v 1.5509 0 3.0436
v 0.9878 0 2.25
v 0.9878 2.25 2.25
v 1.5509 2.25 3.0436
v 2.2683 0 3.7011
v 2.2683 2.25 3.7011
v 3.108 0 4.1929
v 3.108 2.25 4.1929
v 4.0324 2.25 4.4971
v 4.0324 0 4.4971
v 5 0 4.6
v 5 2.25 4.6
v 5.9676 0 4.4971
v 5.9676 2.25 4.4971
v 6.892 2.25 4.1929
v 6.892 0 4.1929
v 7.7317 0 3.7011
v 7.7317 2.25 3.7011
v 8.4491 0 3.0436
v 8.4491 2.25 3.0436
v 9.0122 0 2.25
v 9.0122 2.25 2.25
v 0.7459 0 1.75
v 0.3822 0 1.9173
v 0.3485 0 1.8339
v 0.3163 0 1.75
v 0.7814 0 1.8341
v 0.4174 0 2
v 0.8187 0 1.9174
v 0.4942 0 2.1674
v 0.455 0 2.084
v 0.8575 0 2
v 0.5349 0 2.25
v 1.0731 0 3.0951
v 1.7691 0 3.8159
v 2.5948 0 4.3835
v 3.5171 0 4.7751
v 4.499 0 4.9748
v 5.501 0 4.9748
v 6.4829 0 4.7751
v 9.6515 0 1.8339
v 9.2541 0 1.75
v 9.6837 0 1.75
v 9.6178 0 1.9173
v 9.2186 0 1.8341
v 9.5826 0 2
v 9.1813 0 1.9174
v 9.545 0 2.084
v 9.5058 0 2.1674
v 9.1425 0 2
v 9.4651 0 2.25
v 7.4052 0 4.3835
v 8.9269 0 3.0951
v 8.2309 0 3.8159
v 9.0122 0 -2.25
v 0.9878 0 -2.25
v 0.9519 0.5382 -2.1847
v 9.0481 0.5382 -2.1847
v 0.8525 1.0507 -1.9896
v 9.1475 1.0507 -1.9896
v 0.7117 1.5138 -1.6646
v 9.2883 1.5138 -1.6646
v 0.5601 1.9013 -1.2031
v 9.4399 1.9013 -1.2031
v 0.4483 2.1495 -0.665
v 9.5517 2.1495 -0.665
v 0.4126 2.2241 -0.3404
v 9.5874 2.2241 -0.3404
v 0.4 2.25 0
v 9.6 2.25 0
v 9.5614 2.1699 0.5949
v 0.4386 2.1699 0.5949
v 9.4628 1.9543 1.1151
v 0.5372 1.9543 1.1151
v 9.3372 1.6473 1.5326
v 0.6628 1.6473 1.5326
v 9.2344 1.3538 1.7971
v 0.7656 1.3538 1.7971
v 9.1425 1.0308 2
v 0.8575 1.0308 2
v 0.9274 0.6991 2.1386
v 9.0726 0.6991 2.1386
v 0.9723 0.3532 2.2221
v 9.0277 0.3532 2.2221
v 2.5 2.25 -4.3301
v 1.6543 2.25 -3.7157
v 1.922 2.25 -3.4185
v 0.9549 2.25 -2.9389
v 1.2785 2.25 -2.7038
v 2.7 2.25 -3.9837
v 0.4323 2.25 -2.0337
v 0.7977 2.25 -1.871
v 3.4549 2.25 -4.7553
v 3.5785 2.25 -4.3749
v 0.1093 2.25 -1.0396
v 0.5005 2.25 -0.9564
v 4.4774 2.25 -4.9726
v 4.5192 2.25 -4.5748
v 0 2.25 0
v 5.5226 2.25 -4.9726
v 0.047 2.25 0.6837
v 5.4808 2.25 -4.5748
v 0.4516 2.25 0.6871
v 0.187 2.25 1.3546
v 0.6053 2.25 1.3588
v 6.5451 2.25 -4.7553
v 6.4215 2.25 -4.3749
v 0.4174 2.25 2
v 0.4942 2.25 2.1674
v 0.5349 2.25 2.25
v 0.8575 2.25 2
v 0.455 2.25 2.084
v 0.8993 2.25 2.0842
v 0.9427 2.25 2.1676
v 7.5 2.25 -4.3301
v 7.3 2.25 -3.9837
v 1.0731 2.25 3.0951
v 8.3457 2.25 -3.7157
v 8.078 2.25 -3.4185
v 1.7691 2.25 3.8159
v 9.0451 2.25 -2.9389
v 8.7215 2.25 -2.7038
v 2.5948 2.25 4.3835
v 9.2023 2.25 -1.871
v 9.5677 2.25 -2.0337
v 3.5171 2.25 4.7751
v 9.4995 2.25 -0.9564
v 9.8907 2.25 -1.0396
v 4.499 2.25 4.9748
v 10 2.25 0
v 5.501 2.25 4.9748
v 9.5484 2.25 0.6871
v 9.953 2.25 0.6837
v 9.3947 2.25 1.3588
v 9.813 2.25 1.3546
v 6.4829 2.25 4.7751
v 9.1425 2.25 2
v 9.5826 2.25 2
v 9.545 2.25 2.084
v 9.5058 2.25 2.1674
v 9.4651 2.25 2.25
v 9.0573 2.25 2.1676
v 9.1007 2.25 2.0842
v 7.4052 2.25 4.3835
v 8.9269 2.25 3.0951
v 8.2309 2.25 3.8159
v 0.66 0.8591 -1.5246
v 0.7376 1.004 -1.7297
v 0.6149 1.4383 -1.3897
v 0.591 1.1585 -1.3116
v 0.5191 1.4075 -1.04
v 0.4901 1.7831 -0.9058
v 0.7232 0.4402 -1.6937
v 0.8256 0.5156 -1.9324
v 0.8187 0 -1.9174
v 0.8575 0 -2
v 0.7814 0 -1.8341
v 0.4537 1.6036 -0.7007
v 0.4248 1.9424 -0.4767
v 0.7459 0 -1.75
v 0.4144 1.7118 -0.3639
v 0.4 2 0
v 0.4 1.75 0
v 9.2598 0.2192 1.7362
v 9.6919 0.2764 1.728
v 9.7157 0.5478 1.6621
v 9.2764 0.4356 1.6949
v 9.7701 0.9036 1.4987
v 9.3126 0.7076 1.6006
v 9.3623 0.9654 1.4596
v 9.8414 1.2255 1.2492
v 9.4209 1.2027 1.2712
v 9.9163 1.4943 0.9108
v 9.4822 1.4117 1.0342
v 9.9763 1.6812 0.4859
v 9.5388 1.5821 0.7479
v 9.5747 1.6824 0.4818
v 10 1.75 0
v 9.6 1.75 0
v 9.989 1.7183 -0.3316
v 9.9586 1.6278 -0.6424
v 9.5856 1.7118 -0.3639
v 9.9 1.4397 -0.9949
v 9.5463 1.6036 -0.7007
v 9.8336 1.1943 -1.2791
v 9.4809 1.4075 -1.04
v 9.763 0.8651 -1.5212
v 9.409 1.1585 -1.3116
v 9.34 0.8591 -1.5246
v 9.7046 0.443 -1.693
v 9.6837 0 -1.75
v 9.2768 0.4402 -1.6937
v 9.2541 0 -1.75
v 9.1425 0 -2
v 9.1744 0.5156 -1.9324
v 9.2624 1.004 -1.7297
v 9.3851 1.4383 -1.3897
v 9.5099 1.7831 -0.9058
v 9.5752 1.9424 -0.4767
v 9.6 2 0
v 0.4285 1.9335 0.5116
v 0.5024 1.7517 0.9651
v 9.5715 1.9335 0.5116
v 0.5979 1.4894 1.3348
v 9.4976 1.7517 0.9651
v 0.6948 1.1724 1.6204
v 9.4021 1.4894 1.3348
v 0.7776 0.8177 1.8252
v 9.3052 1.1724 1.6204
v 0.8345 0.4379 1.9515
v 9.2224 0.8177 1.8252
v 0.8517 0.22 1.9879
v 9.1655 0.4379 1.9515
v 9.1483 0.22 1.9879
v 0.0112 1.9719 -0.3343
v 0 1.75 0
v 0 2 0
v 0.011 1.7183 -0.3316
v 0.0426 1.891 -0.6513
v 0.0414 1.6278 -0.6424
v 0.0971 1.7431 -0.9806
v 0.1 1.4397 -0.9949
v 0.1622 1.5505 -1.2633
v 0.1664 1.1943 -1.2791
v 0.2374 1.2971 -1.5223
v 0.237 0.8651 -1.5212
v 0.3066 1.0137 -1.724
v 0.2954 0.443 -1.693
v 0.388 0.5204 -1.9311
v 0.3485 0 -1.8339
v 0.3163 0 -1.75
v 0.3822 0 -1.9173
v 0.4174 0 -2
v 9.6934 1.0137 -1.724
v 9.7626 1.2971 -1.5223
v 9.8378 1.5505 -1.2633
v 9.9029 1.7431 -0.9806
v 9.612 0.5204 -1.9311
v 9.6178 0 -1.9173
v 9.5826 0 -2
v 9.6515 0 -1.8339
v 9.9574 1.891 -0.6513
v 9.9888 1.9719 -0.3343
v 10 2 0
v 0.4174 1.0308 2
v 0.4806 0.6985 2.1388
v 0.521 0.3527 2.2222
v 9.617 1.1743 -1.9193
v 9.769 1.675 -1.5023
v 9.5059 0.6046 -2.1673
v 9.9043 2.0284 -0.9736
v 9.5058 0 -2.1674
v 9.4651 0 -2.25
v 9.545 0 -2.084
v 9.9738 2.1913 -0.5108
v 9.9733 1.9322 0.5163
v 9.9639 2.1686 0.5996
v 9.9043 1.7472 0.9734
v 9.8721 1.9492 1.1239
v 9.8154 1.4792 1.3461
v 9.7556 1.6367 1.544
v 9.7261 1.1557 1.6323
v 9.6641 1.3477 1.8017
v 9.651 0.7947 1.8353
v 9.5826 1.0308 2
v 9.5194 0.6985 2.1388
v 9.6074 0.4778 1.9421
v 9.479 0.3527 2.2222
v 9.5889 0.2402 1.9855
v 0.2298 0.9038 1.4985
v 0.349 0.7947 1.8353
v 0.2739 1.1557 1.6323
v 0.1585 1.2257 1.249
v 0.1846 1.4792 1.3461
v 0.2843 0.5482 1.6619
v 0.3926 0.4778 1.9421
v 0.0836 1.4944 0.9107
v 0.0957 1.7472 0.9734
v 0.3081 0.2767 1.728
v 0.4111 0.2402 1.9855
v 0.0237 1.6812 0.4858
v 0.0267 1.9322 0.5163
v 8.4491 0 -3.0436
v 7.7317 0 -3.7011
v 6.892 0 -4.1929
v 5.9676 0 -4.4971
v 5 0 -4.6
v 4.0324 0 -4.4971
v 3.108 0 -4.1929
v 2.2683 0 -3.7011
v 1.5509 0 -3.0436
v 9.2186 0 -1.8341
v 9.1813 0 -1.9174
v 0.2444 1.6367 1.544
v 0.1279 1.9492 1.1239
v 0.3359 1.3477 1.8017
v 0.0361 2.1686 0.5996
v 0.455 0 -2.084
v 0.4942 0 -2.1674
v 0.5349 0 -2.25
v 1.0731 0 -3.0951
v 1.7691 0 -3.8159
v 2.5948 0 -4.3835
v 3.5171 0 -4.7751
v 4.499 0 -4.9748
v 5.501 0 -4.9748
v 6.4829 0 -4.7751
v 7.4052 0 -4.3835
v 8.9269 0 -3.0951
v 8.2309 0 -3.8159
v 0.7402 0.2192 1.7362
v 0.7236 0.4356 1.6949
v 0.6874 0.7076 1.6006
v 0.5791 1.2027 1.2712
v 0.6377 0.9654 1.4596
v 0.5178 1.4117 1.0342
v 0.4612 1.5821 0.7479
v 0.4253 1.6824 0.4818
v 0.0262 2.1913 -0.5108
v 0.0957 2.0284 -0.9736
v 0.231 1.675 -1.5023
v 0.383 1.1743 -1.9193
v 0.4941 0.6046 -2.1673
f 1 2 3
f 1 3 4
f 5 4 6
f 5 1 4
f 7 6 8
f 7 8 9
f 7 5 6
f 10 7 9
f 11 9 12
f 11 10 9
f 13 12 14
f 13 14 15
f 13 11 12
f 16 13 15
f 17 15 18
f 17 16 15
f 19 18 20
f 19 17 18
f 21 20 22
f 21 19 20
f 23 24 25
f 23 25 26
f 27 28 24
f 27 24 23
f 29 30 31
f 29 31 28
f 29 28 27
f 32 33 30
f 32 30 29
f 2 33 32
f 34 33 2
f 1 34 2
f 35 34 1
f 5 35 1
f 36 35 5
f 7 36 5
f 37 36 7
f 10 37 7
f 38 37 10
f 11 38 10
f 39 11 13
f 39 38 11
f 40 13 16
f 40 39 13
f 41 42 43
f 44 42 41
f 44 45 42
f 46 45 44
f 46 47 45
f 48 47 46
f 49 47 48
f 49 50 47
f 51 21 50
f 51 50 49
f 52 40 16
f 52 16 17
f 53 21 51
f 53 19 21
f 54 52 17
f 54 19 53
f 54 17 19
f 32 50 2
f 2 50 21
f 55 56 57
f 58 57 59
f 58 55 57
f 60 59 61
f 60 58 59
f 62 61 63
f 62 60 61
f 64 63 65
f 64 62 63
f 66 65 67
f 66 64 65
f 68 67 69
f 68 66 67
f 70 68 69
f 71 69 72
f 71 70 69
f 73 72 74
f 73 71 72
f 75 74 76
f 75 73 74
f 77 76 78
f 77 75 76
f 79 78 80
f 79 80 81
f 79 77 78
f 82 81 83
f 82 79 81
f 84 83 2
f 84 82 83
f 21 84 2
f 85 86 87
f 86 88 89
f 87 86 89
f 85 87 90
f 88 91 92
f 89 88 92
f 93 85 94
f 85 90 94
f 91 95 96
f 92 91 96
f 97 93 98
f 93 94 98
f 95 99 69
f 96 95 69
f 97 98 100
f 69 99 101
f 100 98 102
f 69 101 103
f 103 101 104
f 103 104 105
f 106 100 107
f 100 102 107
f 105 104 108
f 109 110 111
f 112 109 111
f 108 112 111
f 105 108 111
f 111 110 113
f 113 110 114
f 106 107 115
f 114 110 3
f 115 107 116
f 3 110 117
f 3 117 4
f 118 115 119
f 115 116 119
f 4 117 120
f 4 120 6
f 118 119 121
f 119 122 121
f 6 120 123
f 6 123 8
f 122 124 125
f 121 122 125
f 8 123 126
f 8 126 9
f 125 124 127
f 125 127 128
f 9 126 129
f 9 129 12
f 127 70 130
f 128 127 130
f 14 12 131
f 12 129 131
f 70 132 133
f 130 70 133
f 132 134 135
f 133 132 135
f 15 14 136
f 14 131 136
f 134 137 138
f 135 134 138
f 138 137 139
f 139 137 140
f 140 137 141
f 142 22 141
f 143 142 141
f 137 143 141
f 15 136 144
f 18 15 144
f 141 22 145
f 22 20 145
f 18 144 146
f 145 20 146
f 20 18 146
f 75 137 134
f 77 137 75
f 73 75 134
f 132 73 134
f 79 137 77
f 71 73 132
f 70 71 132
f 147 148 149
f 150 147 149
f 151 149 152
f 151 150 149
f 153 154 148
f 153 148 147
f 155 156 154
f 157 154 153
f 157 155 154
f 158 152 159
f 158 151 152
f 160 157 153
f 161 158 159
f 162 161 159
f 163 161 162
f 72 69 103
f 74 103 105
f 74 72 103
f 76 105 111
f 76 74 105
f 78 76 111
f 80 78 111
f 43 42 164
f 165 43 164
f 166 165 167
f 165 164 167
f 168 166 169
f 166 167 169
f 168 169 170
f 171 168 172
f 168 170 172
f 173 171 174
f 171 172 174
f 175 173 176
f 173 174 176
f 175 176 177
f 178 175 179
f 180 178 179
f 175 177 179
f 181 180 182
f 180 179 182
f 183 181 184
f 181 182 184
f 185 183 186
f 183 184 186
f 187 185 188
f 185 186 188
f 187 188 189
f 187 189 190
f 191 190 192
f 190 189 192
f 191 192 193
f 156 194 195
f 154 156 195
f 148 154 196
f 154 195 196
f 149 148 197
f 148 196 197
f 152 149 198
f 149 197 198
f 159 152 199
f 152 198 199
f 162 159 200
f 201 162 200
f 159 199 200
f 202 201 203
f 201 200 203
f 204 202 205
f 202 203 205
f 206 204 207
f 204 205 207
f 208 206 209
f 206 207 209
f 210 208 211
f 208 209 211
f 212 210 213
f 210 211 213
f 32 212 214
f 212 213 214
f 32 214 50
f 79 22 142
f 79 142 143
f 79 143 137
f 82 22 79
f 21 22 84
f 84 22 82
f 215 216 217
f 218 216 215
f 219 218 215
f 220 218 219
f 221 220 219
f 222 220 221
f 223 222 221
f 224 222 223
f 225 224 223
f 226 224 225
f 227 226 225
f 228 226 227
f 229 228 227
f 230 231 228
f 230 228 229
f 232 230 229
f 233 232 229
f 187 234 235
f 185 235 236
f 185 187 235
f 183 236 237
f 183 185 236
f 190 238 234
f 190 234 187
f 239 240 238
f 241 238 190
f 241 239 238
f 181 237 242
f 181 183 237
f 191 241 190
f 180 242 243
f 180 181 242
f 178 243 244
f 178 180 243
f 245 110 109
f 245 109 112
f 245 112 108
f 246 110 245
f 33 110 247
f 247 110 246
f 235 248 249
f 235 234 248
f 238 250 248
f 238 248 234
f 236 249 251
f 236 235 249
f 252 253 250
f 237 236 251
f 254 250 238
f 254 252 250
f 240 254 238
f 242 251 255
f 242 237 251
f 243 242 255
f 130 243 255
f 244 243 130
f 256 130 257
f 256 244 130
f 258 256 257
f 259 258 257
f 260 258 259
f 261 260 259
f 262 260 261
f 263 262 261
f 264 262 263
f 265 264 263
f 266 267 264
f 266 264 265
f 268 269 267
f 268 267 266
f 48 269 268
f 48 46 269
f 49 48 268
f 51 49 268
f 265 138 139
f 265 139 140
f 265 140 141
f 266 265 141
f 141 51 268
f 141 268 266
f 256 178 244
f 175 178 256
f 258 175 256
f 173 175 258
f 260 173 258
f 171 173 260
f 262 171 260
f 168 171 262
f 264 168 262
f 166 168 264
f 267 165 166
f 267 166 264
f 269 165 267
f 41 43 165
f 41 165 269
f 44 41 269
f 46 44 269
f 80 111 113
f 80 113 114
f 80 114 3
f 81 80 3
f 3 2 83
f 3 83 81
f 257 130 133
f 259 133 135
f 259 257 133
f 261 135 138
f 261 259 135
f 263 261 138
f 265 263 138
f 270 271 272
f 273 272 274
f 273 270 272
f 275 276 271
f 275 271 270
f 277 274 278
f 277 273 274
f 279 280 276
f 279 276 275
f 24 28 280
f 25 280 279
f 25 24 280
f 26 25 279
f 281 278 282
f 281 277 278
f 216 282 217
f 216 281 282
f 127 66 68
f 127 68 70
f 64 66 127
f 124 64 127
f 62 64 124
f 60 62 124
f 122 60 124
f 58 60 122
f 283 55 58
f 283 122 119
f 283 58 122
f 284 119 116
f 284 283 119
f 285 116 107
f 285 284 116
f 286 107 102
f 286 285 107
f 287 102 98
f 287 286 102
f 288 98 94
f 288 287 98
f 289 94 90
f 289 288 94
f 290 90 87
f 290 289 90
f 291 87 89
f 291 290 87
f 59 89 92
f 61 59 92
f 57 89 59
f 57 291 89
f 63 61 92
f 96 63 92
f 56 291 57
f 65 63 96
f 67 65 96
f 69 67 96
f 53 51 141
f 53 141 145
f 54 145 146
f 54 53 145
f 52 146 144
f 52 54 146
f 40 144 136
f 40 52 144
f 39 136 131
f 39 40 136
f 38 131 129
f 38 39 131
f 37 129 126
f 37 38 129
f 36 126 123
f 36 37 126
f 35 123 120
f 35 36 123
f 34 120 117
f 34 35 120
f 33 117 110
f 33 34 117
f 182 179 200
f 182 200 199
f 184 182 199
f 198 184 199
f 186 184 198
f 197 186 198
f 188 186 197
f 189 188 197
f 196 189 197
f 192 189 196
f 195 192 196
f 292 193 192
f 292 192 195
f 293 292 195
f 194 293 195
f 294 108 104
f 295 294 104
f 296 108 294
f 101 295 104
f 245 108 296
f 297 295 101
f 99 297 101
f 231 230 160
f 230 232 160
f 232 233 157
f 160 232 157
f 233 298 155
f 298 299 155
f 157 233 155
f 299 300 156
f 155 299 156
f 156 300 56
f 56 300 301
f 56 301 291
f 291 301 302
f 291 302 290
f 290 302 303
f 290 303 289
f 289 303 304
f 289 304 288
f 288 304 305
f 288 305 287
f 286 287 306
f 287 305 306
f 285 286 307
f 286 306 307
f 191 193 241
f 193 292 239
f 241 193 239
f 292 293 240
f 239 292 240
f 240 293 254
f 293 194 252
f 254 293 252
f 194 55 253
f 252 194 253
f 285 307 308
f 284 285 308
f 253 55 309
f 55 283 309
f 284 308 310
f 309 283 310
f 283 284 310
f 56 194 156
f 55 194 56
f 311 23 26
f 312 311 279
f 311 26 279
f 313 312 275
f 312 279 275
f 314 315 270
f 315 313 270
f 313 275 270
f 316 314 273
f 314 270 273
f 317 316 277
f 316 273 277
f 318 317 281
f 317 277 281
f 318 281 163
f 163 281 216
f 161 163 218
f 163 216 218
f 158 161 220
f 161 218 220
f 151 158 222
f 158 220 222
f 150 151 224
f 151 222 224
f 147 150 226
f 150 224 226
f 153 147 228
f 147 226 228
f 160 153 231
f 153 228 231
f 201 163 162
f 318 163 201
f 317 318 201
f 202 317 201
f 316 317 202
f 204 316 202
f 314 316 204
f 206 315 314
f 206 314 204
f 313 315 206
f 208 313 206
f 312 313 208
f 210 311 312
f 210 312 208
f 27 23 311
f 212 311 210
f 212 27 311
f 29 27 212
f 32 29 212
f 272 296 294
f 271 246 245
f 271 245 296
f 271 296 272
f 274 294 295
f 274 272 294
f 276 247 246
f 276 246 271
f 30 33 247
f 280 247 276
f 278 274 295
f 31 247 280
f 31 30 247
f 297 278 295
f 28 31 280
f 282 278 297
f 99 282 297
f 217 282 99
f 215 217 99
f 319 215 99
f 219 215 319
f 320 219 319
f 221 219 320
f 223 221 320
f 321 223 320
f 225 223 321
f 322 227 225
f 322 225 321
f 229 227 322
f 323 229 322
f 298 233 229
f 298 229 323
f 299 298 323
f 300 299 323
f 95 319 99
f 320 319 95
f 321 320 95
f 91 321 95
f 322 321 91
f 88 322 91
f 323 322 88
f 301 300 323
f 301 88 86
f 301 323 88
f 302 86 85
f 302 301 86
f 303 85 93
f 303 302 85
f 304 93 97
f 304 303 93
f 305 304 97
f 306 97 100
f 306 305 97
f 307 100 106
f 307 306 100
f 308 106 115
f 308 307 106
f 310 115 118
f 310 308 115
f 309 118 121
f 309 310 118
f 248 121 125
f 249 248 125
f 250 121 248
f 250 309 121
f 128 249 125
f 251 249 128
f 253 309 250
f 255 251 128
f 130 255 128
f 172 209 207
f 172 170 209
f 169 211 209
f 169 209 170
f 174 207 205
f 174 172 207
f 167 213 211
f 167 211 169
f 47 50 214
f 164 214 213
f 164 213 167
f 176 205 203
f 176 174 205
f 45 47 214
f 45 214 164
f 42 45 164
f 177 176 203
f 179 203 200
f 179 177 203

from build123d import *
from build123d.topology import SkipClean

# Parameters (mm, degrees)
SKETCH3_R             = 1.75
STIR_BAR_DEPTH        = 10
SKETCH4_W             = 10.5
SKETCH4_H             = 0.25
STIR_BAR_HOLDER_ANGLE = 180
BOSS_EXTRUDE1_DEPTH   = 2.25
SKETCH10_R            = 5.711829829
SKETCH10_R_2          = 5
CUT_EXTRUDE5_DEPTH    = 12.624328088
SKETCH9_R             = 1.75
CUT_EXTRUDE6_DEPTH    = 12.404494879


with BuildPart() as part:
    # Sketch3 → Stir Bar (new body)
    with BuildSketch(Plane(origin=(0, 0, 0), x_dir=(0, 0, -1), z_dir=(1, 0, 0))):
        Circle(SKETCH3_R)
    extrude(amount=STIR_BAR_DEPTH)



with BuildPart() as body_2:
    # Sketch4 → Stir Bar Holder (revolve)
    with BuildSketch(Plane(origin=(0, 0, 0), x_dir=(1, 0, 0), z_dir=(0, 1, 0))):
        with Locations((5, 2.125)):
            Rectangle(SKETCH4_W, SKETCH4_H)
    revolve(axis=Axis((-0.25, 0, 0), (1, 0, 0)), revolution_arc=STIR_BAR_HOLDER_ANGLE)


with BuildPart() as part_1:
    with SkipClean():  # the faces are left unmerged after this step: merging them gives an invalid solid
        add(part.part)

        add(body_2.part)  # Boss-Extrude1 merges body 2
        # Sketch5 → Boss-Extrude1 (add, through all)
        with BuildSketch(Plane.XZ):
            with BuildLine():
                ThreePointArc((0.987831011, 2.25), (5, 4.6), (9.012168989, 2.25))
                Line((9.012168989, 2.25), (9.465142775, 2.25))
                ThreePointArc((9.465142775, 2.25), (5, 5), (0.534857225, 2.25))
                Line((0.534857225, 2.25), (0.987831011, 2.25))
            make_face()
            with BuildLine():
                ThreePointArc((9.012168989, 2.25), (9.079231651, 2.125998385), (9.142463035, 2))
                Line((9.142463035, 2), (9.582575695, 2))
                ThreePointArc((9.582575695, 2), (9.52558586, 2.125811051), (9.465142775, 2.25))
                Line((9.465142775, 2.25), (9.012168989, 2.25))
            make_face()
            with BuildLine():
                Line((0.417424305, 2), (0.857536965, 2))
                ThreePointArc((0.857536965, 2), (0.920768349, 2.125998385), (0.987831011, 2.25))
                Line((0.987831011, 2.25), (0.534857225, 2.25))
                ThreePointArc((0.534857225, 2.25), (0.47441414, 2.125811051), (0.417424305, 2))
            make_face()
            with BuildLine():
                ThreePointArc((9.142463035, 2), (9.484157109, 1.025833816), (9.6, 0))
                Line((9.6, 0), (10, 0))
                ThreePointArc((10, 0), (9.894531565, 1.021548218), (9.582575695, 2))
                Line((9.582575695, 2), (9.142463035, 2))
            make_face()
            with BuildLine():
                Line((0, 0), (0.4, 0))
                ThreePointArc((0.4, 0), (0.515842891, 1.025833816), (0.857536965, 2))
                Line((0.857536965, 2), (0.417424305, 2))
                ThreePointArc((0.417424305, 2), (0.105468435, 1.021548218), (0, 0))
            make_face()
            with BuildLine():
                Line((10, 0), (9.6, 0))
                ThreePointArc((9.6, 0), (5, -4.6), (0.4, 0))
                Line((0.4, 0), (0, 0))
                ThreePointArc((0, 0), (5, -5), (10, 0))
            make_face()
        extrude(amount=-BOSS_EXTRUDE1_DEPTH)

    # Sketch10 → Cut-Extrude5 (cut, through all)
    with BuildSketch(Plane.XZ):
        with Locations((5, 0)):
            Circle(SKETCH10_R)
        with Locations(Location((5, 0, 0), (0, 0, 270))):
            Circle(SKETCH10_R_2, mode=Mode.SUBTRACT)
    extrude(amount=-CUT_EXTRUDE5_DEPTH, mode=Mode.SUBTRACT)

    # Sketch9 → Cut-Extrude6 (cut, through all)
    with BuildSketch(Plane.ZY):
        Circle(SKETCH9_R)
    extrude(amount=-CUT_EXTRUDE6_DEPTH, mode=Mode.SUBTRACT)


solid = part_1.part
